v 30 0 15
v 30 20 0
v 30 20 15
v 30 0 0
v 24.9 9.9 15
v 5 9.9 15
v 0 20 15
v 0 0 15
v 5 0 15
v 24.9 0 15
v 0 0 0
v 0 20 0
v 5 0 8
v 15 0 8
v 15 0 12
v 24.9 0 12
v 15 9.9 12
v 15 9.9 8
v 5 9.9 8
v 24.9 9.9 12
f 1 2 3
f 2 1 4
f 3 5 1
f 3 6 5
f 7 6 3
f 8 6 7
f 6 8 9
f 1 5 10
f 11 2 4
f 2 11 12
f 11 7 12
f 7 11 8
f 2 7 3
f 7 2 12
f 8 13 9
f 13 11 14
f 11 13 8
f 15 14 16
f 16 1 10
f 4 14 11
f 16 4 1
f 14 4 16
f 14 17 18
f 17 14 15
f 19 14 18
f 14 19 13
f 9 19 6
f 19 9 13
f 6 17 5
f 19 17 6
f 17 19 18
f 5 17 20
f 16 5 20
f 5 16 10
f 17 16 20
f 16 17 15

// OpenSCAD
difference(){
    cube([30,20,15]);

    translate([5,-.1,8])
    cube([10,10,30]);

    translate([15-.1,-.1,12])
    cube([10,10,30]);
}
